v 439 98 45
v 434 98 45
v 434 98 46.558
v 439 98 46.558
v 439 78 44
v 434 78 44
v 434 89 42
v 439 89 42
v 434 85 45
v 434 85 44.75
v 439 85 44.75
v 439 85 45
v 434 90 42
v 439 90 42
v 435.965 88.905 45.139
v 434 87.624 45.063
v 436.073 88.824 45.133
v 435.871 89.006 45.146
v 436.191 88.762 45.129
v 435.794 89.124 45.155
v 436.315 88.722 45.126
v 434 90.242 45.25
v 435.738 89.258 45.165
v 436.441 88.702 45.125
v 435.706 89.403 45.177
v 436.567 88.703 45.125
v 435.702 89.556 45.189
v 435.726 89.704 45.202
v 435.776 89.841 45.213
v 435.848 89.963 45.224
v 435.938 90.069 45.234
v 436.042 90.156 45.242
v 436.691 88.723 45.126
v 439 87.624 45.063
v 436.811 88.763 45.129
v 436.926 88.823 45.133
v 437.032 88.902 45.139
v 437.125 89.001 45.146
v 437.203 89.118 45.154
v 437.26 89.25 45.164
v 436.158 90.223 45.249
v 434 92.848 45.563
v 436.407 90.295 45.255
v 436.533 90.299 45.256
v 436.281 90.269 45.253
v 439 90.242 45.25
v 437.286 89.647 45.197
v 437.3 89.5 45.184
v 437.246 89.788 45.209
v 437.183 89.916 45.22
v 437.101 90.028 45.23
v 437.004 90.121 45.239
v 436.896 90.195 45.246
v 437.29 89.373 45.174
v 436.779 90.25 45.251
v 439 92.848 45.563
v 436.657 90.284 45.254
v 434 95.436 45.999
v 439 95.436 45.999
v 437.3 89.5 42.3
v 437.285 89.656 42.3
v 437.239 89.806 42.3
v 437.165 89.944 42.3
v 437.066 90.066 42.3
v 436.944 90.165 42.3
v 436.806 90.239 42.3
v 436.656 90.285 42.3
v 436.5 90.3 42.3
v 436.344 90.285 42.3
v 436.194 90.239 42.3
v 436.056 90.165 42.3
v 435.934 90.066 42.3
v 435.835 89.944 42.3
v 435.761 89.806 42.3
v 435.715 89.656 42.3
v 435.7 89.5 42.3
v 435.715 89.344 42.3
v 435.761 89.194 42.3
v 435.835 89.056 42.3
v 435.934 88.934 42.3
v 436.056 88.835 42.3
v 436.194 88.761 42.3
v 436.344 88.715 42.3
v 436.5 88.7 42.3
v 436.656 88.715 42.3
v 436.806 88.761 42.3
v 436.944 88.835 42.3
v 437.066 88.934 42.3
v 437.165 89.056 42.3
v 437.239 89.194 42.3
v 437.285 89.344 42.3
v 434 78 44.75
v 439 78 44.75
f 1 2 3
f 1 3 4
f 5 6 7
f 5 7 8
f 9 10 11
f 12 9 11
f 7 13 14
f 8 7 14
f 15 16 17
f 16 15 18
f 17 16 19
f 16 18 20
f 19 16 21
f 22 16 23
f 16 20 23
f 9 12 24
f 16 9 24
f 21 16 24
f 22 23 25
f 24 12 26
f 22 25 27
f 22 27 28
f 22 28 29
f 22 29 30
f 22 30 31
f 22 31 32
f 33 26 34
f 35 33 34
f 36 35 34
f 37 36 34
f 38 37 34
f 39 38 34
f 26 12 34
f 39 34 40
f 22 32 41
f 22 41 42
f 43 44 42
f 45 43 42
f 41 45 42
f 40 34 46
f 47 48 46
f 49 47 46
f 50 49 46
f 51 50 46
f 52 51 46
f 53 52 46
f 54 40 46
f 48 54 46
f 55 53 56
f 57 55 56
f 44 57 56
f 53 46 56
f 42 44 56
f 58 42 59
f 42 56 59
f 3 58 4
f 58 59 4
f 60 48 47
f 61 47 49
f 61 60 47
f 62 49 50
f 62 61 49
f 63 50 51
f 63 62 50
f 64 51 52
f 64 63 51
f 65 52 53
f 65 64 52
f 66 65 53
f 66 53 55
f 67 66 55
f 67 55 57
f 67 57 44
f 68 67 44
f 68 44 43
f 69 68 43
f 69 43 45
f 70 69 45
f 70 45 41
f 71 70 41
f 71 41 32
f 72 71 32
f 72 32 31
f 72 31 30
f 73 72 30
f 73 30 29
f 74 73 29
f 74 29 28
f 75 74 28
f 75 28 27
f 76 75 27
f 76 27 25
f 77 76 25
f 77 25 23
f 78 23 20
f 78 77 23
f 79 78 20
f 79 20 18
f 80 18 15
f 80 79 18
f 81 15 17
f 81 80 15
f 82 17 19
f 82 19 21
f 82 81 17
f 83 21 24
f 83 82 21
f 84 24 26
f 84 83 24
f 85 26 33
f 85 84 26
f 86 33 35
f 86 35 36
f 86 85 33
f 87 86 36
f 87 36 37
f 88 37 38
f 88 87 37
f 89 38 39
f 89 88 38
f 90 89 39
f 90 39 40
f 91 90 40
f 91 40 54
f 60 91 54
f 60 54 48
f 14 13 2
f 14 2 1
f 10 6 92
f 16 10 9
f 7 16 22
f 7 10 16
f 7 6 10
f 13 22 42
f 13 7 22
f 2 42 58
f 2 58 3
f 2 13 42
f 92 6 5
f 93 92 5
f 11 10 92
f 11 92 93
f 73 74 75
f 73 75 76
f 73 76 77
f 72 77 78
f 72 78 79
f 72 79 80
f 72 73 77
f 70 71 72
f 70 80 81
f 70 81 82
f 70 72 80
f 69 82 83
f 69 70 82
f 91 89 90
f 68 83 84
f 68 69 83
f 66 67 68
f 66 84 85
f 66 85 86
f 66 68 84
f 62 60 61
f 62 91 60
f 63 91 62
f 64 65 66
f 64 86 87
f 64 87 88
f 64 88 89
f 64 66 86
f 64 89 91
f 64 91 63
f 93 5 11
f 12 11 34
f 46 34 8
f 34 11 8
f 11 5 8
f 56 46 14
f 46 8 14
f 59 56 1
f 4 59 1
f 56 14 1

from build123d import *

# Parameters (mm, degrees)
CYLINDER1272_R     = 0.8
CYLINDER1272_DEPTH = 10
CYLINDER1273_W     = 55
CYLINDER1273_H     = 60
CYLINDER1273_ANGLE = 80
BOX540_W           = 10
BOX540_H           = 20
BOX540_DEPTH       = 6
BOX539_W           = 5
BOX539_H           = 20
BOX539_DEPTH       = 6
CHAMFER034_SIZE2   = 8
CHAMFER034_SIZE    = 3
CHAMFER035_SIZE2   = 2
CHAMFER035_SIZE    = 11


with BuildPart() as cylinder1443:
    # Cylinder1272 → Cylinder1272 (new body)
    with BuildSketch(Plane(origin=(436.5, 89.5, 42.3), x_dir=(1, 0, 0), z_dir=(0, 0, 1))):
        Circle(CYLINDER1272_R)
    extrude(amount=CYLINDER1272_DEPTH)


with BuildPart() as cylinder1273:
    # Cylinder1273 → Cylinder1273 (revolve)
    with BuildSketch(Plane(origin=(432, 85, 100), x_dir=(0, 0, -1), z_dir=(0, -1, 0))):
        with Locations((27.5, 30)):
            Rectangle(CYLINDER1273_W, CYLINDER1273_H)
    revolve(axis=Axis((432, 85, 100), (1, 0, 0)), revolution_arc=CYLINDER1273_ANGLE)


with BuildPart() as fusion248002050161:
    # Box540 → Box540 (new body)
    with BuildSketch(Plane(origin=(434, 65, 44.75), x_dir=(1, 0, 0), z_dir=(0, 0, 1))):
        with Locations((5, 10)):
            Rectangle(BOX540_W, BOX540_H)
    extrude(amount=BOX540_DEPTH)

    # Fusion248002050161: union Cylinder1273
    add(cylinder1273.part)


with BuildPart() as bucket_tooth:
    # Box539 → Box539 (new body)
    with BuildSketch(Plane(origin=(434, 78, 42), x_dir=(1, 0, 0), z_dir=(0, 0, 1))):
        with Locations((2.5, 10)):
            Rectangle(BOX539_W, BOX539_H)
    extrude(amount=BOX539_DEPTH)

    # Cut014288: cut Fusion248002050161
    add(fusion248002050161.part, mode=Mode.SUBTRACT)

    # Chamfer034
    chamfer034_edges = [bucket_tooth.edges().sort_by_distance(p)[0] for p in [
        (436.5, 98, 42),
    ]]
    chamfer034_side = bucket_tooth.faces().sort_by_distance((436.5, 98, 44.279222))[0]
    chamfer(chamfer034_edges, length=CHAMFER034_SIZE, length2=CHAMFER034_SIZE2, reference=chamfer034_side)

    # Chamfer035
    chamfer035_edges = [bucket_tooth.edges().sort_by_distance(p)[0] for p in [
        (436.5, 78, 42),
    ]]
    chamfer035_side = bucket_tooth.faces().sort_by_distance((436.5, 84, 42))[0]
    chamfer(chamfer035_edges, length=CHAMFER035_SIZE, length2=CHAMFER035_SIZE2, reference=chamfer035_side)

    # Cut014289: cut Cylinder1443
    add(cylinder1443.part, mode=Mode.SUBTRACT)


solid = bucket_tooth.part
